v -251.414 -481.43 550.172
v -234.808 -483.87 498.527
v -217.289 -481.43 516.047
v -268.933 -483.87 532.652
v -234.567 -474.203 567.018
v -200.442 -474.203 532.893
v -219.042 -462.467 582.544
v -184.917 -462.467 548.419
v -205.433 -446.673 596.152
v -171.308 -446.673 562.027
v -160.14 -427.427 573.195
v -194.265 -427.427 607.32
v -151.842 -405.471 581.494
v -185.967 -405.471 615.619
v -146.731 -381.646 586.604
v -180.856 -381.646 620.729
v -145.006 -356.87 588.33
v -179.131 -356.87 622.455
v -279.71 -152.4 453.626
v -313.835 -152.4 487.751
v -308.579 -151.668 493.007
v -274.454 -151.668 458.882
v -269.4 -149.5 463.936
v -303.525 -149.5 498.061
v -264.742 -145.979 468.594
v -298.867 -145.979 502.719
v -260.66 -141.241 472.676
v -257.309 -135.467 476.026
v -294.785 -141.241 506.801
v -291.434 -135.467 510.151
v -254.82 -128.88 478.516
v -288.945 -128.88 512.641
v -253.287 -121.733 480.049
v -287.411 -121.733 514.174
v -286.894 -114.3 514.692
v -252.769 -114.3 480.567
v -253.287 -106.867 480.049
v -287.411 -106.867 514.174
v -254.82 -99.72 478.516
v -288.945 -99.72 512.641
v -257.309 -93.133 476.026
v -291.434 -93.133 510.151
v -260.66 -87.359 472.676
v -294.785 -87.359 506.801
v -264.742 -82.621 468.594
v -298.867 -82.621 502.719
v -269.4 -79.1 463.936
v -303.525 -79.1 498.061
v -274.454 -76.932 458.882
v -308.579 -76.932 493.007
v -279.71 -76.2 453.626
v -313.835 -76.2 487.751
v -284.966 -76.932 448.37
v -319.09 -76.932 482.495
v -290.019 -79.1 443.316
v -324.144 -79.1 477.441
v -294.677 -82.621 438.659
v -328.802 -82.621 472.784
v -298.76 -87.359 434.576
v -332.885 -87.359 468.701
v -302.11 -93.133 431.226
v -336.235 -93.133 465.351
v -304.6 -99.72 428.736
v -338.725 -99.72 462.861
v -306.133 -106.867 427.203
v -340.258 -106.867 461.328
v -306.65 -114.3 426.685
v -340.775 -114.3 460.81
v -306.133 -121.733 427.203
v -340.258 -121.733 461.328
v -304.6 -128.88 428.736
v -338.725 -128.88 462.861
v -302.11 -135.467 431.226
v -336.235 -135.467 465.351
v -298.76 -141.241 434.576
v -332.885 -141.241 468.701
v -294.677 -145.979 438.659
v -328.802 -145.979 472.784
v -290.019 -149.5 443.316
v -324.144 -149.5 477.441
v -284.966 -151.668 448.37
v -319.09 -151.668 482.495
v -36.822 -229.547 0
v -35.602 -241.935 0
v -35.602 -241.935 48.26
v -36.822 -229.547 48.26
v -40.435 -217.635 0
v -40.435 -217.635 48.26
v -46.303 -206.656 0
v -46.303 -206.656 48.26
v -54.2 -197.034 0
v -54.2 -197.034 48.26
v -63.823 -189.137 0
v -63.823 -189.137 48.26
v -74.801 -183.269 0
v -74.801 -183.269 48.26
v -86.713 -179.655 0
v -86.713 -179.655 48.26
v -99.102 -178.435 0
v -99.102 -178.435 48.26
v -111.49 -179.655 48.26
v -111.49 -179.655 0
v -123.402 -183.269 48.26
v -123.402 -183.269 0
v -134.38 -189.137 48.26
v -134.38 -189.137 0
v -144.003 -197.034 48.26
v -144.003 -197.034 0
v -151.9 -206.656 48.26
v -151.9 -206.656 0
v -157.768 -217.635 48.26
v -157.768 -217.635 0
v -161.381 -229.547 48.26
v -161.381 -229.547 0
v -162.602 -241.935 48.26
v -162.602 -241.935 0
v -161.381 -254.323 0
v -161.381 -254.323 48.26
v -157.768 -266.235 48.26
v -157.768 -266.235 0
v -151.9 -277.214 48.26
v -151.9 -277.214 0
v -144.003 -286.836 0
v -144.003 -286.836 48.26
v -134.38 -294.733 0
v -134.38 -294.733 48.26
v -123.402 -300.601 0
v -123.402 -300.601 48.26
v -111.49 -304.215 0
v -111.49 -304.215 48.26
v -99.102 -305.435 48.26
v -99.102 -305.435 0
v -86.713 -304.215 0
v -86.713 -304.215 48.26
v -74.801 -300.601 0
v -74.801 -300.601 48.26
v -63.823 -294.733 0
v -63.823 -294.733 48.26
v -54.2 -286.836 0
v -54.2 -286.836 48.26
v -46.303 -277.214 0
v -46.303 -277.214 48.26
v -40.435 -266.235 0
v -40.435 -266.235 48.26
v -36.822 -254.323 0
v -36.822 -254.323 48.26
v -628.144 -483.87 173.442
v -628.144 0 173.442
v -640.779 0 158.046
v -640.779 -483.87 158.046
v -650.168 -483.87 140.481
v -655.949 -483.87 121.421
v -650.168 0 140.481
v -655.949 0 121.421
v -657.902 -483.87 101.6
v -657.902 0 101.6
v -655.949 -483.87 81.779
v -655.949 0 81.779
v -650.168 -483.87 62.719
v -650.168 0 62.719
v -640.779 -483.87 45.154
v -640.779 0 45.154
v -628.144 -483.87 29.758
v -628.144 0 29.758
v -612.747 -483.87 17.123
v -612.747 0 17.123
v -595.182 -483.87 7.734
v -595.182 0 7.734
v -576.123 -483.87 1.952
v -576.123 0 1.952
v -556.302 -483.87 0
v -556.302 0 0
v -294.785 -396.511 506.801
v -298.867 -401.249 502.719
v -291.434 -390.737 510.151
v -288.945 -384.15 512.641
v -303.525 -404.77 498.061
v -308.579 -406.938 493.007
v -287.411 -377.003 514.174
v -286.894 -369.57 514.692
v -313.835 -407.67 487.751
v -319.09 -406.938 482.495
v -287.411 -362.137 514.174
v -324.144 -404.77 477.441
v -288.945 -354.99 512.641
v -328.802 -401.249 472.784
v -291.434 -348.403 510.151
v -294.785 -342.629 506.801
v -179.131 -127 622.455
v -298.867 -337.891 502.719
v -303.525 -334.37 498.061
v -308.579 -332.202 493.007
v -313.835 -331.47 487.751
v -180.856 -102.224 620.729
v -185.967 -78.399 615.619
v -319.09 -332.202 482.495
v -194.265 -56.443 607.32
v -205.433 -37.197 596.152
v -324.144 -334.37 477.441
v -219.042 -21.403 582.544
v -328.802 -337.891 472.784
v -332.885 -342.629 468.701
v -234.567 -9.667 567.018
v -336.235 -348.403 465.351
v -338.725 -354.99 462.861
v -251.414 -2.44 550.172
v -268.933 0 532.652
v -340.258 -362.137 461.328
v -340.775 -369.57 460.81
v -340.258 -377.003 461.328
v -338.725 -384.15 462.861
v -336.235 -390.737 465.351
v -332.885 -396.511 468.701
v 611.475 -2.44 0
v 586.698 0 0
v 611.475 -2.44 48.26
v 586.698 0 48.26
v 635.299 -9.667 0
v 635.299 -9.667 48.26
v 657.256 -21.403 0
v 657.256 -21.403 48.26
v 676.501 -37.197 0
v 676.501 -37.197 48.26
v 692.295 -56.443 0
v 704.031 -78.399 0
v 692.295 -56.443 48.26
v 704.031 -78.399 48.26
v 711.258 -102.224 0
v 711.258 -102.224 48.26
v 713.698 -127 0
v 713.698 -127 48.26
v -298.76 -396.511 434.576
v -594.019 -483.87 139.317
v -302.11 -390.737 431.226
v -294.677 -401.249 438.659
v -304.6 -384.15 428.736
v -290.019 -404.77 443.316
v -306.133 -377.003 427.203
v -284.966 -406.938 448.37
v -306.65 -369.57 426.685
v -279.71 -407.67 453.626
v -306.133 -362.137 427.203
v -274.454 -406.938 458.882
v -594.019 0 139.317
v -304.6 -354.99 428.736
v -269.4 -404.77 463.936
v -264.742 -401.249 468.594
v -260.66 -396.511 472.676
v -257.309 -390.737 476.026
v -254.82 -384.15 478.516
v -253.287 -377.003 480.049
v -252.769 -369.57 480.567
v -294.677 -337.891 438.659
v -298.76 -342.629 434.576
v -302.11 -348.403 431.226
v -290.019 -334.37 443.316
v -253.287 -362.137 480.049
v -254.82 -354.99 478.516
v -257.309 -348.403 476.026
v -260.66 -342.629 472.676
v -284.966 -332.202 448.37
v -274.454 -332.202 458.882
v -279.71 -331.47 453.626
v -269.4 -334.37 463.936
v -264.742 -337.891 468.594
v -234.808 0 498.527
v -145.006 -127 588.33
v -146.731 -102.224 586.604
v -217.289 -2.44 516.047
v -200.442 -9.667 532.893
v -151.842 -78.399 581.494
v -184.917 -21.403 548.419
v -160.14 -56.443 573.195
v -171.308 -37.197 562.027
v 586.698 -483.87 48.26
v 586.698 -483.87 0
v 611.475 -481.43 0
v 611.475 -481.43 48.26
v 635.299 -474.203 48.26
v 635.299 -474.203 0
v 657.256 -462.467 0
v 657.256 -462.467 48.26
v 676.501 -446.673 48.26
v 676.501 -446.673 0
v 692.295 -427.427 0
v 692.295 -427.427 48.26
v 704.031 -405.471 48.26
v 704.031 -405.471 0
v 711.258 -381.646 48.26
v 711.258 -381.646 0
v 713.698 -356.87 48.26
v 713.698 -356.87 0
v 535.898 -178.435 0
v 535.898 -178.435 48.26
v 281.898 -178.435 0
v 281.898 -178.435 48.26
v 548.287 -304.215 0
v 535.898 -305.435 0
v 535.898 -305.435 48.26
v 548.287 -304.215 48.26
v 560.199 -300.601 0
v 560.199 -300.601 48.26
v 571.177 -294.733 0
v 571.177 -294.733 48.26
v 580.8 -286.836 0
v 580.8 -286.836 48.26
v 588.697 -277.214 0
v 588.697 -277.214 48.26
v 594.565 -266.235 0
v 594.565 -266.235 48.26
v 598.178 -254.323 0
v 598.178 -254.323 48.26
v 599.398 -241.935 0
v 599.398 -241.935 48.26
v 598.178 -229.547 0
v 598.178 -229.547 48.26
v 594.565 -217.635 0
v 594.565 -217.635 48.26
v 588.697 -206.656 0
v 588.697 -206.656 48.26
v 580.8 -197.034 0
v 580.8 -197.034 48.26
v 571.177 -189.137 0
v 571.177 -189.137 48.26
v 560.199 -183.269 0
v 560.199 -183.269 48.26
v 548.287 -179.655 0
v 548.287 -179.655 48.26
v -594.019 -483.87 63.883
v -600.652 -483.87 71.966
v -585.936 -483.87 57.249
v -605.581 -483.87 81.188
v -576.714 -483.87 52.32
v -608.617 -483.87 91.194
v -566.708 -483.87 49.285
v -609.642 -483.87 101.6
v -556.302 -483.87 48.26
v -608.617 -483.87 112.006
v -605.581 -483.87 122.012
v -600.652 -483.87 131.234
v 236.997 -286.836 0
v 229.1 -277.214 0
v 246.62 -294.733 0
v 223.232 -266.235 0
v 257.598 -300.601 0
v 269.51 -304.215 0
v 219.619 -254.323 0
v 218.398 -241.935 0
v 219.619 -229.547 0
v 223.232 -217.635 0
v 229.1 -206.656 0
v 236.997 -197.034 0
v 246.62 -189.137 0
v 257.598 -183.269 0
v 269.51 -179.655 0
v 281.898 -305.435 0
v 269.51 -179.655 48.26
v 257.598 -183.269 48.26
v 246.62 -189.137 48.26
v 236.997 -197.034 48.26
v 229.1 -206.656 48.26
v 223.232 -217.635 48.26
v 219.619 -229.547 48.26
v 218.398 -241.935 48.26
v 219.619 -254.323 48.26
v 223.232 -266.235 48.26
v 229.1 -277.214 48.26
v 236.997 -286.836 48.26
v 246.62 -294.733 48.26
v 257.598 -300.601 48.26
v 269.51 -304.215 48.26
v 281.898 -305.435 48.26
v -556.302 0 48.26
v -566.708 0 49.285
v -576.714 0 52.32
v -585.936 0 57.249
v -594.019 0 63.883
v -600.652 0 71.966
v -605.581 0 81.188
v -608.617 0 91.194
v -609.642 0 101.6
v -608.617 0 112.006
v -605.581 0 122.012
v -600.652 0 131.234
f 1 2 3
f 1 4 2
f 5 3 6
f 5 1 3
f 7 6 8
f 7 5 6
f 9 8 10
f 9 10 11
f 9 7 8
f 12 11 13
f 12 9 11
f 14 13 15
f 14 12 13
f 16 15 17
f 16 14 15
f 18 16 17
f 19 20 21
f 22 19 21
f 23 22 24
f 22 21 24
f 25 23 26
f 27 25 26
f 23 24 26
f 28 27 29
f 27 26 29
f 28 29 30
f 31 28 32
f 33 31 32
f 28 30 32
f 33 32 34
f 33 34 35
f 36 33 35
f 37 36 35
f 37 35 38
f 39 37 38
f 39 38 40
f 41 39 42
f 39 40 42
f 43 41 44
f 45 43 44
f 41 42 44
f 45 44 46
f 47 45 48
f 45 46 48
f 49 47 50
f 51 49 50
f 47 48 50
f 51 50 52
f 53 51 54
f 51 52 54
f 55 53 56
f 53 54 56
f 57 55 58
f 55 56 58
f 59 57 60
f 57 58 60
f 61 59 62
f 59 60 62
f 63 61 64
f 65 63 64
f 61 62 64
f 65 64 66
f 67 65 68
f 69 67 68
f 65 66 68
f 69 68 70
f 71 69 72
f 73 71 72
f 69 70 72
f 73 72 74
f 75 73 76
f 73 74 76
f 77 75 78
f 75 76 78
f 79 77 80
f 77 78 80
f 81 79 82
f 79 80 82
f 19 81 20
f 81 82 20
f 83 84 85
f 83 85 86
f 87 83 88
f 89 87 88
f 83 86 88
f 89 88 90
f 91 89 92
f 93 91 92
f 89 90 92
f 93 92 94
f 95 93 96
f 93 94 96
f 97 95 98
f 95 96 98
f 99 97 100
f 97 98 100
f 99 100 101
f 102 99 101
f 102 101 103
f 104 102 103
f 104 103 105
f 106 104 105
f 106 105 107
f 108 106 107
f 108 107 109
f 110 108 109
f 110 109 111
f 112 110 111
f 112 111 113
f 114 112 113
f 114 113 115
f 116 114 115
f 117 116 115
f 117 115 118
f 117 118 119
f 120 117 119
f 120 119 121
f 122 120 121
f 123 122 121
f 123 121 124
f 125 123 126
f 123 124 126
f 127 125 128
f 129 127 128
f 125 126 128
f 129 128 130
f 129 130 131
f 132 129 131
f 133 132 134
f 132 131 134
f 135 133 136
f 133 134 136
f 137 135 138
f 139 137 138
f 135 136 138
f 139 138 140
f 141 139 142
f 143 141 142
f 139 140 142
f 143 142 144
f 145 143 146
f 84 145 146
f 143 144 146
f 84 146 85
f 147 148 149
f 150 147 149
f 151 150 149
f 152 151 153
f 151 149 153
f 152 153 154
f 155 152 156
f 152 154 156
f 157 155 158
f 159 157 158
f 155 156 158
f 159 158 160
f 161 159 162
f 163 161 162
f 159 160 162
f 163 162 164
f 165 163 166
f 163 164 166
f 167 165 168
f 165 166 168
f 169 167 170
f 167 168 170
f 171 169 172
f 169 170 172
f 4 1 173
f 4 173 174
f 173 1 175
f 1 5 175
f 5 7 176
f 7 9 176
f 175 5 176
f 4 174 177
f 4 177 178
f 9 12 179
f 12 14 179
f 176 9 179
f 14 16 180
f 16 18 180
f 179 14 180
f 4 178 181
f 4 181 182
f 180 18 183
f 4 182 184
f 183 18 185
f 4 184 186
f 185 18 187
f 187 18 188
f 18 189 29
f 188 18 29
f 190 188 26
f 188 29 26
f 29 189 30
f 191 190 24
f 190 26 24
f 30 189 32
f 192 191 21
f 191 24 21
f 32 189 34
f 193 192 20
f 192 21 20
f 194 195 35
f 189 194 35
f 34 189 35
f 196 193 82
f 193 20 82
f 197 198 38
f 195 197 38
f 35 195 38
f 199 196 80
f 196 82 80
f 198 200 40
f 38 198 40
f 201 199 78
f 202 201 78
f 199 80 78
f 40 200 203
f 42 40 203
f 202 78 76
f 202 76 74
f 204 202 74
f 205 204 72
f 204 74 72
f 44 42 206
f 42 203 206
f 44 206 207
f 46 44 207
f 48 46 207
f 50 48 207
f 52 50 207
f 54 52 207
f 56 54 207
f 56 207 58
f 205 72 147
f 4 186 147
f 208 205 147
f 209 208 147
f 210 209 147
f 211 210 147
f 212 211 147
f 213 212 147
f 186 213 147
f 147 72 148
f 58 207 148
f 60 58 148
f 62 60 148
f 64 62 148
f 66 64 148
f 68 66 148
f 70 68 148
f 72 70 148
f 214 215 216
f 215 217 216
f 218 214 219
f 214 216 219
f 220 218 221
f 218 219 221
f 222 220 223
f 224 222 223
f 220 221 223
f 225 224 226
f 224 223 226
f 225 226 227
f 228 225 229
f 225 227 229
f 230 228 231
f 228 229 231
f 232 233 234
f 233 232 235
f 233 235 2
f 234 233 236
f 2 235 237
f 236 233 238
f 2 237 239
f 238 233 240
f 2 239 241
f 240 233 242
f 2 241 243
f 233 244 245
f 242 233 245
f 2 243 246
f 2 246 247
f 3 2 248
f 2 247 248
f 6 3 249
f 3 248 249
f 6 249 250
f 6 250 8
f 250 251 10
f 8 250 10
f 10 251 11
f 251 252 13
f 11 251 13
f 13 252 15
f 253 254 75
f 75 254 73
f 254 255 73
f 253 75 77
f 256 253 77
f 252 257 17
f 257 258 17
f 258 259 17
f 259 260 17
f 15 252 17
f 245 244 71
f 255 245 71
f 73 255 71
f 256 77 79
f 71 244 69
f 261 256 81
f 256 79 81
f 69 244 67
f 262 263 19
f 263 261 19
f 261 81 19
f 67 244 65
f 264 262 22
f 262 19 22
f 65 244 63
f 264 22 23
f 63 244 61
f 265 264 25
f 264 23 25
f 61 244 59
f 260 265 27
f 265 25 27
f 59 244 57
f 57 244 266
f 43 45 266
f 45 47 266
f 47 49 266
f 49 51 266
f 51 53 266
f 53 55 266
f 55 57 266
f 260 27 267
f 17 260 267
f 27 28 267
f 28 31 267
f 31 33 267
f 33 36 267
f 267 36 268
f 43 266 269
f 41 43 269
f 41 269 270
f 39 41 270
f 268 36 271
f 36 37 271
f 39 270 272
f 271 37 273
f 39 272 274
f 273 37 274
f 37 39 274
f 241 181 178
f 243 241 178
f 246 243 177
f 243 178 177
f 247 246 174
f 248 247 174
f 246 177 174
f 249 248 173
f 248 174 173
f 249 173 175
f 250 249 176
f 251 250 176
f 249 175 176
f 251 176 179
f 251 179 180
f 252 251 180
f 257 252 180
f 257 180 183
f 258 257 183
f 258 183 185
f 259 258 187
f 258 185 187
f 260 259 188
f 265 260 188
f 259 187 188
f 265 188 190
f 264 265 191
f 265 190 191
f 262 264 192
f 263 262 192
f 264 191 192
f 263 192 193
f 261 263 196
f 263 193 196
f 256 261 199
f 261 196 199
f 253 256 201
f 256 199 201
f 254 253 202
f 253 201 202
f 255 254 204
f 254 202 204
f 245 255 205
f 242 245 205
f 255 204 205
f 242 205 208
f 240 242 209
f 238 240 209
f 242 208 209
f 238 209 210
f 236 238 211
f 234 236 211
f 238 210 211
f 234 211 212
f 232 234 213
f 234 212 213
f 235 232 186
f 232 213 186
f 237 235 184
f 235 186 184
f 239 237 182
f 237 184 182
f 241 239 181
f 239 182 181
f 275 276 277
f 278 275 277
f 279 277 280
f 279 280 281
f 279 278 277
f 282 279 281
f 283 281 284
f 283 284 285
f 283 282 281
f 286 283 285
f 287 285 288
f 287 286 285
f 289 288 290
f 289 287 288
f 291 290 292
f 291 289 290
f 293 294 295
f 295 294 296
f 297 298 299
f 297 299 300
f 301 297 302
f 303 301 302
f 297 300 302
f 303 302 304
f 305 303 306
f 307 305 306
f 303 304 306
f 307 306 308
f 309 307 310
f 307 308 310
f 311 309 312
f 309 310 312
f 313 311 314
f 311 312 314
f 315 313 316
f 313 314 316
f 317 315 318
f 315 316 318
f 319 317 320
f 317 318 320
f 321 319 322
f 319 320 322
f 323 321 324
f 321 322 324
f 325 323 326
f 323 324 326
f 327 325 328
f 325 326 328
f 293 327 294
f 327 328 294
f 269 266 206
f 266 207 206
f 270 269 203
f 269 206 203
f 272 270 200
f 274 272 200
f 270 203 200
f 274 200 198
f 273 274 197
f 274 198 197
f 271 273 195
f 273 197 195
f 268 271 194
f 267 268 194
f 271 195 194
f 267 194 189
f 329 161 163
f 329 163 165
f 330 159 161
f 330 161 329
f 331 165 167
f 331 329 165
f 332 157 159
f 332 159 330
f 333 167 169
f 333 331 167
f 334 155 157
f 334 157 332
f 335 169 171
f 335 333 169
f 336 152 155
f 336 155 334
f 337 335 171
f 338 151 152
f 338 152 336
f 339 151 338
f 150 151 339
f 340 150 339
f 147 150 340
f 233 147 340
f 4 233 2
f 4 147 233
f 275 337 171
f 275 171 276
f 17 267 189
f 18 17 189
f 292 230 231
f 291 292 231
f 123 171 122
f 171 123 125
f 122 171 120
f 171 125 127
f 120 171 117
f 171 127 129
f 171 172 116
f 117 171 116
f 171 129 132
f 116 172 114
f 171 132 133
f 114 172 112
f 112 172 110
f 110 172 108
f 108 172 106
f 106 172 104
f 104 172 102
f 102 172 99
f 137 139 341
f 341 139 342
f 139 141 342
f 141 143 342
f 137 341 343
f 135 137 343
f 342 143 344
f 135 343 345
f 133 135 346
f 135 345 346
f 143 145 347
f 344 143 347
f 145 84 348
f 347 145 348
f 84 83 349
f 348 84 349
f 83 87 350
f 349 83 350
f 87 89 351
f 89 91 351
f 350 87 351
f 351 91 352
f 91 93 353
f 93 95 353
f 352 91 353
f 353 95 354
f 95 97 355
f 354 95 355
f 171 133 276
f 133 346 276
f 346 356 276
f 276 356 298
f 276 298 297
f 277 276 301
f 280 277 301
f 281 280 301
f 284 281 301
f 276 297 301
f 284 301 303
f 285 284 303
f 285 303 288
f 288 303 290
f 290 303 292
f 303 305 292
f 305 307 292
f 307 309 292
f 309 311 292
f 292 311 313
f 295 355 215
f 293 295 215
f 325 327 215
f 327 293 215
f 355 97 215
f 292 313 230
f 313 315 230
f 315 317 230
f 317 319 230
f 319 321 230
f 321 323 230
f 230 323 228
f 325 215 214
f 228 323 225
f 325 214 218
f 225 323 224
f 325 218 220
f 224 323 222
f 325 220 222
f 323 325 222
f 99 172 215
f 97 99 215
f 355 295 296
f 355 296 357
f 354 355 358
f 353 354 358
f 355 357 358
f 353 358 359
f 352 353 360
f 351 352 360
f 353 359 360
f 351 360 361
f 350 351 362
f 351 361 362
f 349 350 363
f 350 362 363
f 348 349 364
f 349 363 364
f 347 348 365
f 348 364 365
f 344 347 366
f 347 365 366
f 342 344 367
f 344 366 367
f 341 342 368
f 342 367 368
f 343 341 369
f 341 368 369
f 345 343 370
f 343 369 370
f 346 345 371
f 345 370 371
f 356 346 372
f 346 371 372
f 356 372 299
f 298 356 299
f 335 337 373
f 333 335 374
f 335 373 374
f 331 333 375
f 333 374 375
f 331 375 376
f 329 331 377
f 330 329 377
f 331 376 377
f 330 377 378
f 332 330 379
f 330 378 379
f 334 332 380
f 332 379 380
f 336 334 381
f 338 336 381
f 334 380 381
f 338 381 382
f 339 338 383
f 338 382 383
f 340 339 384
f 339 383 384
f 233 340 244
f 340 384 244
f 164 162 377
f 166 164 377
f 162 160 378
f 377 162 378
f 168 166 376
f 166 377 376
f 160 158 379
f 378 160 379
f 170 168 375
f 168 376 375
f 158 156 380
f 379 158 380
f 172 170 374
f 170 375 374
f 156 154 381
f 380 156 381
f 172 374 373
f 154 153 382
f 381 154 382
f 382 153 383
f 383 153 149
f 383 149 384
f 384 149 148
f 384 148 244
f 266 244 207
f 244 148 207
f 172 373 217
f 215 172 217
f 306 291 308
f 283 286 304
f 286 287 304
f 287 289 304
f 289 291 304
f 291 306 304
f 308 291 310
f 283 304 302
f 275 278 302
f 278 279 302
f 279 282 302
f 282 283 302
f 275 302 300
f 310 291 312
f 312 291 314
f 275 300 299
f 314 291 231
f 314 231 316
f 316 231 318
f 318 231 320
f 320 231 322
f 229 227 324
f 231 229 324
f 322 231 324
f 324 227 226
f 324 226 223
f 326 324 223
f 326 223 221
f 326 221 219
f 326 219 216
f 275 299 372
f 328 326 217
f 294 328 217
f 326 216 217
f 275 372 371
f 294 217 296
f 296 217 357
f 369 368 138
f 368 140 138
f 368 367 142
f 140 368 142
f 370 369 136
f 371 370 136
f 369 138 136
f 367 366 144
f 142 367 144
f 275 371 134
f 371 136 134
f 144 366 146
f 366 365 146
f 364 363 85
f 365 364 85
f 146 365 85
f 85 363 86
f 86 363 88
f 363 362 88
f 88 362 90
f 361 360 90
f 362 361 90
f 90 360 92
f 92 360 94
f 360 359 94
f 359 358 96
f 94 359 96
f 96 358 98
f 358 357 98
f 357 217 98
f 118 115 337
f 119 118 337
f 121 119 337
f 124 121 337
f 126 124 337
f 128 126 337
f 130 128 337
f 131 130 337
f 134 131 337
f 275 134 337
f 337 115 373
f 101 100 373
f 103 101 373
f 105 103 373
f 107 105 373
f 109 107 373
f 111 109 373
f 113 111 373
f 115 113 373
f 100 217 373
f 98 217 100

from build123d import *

# Parameters (mm, degrees)
F1_DEPTH = 483.87
F2_R     = 38.1
F3_DEPTH = 48.26
F4_R     = 63.5
F5_DEPTH = 48.261
F6_R     = 127


with BuildPart() as f1:
    # F0 (on Front) → F1 (new body)
    with BuildSketch(Plane.XZ):
        with BuildLine():
            Line((-556.3015167441, 0), (713.6984832559, 0))
            Line((713.6984832559, 0), (713.6984832559, 48.26))
            Line((713.6984832559, 48.26), (-556.3015167441, 48.26))
            ThreePointArc((-556.3015167441, 48.26), (-605.5812510083, 81.1876657176), (-594.0185924526, 139.3170757085))
            Line((-594.0185924526, 139.3170757085), (-145.0057863992, 588.3298817619))
            Line((-145.0057863992, 588.3298817619), (-179.1307596592, 622.454855022))
            Line((-179.1307596592, 622.454855022), (-628.1435657127, 173.4420489685))
            ThreePointArc((-628.1435657127, 173.4420489685), (-650.1676772473, 62.7193632717), (-556.3015167441, 0))
        make_face()
    extrude(amount=F1_DEPTH)

    # F2 (on face) → F3 (cut, through all)
    with BuildSketch(Plane(origin=(-400.7928073406, 0, 400.7928073406), x_dir=(0, -1, 0), z_dir=(-0.7071067812, 0, 0.7071067812))):
        with Locations((114.3, 122.9774740944)):
            Circle(F2_R)
        with Locations((369.57, 122.9774740944)):
            Circle(F2_R)
    extrude(amount=-F3_DEPTH, mode=Mode.SUBTRACT)

    # F4 (on face) → F5 (cut, through all)
    with BuildSketch(Plane.XY.offset(48.26)):
        with BuildLine():
            Line((281.8984832559, -305.435), (535.8984832559, -305.435))
            ThreePointArc((535.8984832559, -305.435), (599.3984832559, -241.935), (535.8984832559, -178.435))
            Line((535.8984832559, -178.435), (281.8984832559, -178.435))
            ThreePointArc((281.8984832559, -178.435), (218.3984832559, -241.935), (281.8984832559, -305.435))
        make_face()
        with Locations((-99.1015167441, -241.935)):
            Circle(F4_R)
    extrude(amount=-F5_DEPTH, mode=Mode.SUBTRACT)

    # F6
    f6_edges = [f1.edges().sort_by_distance(p)[0] for p in [
        (713.698483, -483.87, 24.13),
        (713.698483, 0, 24.13),
        (-162.068273, 0, 605.392368),
        (-162.068273, -483.87, 605.392368),
    ]]
    fillet(f6_edges, radius=F6_R)


solid = f1.part
